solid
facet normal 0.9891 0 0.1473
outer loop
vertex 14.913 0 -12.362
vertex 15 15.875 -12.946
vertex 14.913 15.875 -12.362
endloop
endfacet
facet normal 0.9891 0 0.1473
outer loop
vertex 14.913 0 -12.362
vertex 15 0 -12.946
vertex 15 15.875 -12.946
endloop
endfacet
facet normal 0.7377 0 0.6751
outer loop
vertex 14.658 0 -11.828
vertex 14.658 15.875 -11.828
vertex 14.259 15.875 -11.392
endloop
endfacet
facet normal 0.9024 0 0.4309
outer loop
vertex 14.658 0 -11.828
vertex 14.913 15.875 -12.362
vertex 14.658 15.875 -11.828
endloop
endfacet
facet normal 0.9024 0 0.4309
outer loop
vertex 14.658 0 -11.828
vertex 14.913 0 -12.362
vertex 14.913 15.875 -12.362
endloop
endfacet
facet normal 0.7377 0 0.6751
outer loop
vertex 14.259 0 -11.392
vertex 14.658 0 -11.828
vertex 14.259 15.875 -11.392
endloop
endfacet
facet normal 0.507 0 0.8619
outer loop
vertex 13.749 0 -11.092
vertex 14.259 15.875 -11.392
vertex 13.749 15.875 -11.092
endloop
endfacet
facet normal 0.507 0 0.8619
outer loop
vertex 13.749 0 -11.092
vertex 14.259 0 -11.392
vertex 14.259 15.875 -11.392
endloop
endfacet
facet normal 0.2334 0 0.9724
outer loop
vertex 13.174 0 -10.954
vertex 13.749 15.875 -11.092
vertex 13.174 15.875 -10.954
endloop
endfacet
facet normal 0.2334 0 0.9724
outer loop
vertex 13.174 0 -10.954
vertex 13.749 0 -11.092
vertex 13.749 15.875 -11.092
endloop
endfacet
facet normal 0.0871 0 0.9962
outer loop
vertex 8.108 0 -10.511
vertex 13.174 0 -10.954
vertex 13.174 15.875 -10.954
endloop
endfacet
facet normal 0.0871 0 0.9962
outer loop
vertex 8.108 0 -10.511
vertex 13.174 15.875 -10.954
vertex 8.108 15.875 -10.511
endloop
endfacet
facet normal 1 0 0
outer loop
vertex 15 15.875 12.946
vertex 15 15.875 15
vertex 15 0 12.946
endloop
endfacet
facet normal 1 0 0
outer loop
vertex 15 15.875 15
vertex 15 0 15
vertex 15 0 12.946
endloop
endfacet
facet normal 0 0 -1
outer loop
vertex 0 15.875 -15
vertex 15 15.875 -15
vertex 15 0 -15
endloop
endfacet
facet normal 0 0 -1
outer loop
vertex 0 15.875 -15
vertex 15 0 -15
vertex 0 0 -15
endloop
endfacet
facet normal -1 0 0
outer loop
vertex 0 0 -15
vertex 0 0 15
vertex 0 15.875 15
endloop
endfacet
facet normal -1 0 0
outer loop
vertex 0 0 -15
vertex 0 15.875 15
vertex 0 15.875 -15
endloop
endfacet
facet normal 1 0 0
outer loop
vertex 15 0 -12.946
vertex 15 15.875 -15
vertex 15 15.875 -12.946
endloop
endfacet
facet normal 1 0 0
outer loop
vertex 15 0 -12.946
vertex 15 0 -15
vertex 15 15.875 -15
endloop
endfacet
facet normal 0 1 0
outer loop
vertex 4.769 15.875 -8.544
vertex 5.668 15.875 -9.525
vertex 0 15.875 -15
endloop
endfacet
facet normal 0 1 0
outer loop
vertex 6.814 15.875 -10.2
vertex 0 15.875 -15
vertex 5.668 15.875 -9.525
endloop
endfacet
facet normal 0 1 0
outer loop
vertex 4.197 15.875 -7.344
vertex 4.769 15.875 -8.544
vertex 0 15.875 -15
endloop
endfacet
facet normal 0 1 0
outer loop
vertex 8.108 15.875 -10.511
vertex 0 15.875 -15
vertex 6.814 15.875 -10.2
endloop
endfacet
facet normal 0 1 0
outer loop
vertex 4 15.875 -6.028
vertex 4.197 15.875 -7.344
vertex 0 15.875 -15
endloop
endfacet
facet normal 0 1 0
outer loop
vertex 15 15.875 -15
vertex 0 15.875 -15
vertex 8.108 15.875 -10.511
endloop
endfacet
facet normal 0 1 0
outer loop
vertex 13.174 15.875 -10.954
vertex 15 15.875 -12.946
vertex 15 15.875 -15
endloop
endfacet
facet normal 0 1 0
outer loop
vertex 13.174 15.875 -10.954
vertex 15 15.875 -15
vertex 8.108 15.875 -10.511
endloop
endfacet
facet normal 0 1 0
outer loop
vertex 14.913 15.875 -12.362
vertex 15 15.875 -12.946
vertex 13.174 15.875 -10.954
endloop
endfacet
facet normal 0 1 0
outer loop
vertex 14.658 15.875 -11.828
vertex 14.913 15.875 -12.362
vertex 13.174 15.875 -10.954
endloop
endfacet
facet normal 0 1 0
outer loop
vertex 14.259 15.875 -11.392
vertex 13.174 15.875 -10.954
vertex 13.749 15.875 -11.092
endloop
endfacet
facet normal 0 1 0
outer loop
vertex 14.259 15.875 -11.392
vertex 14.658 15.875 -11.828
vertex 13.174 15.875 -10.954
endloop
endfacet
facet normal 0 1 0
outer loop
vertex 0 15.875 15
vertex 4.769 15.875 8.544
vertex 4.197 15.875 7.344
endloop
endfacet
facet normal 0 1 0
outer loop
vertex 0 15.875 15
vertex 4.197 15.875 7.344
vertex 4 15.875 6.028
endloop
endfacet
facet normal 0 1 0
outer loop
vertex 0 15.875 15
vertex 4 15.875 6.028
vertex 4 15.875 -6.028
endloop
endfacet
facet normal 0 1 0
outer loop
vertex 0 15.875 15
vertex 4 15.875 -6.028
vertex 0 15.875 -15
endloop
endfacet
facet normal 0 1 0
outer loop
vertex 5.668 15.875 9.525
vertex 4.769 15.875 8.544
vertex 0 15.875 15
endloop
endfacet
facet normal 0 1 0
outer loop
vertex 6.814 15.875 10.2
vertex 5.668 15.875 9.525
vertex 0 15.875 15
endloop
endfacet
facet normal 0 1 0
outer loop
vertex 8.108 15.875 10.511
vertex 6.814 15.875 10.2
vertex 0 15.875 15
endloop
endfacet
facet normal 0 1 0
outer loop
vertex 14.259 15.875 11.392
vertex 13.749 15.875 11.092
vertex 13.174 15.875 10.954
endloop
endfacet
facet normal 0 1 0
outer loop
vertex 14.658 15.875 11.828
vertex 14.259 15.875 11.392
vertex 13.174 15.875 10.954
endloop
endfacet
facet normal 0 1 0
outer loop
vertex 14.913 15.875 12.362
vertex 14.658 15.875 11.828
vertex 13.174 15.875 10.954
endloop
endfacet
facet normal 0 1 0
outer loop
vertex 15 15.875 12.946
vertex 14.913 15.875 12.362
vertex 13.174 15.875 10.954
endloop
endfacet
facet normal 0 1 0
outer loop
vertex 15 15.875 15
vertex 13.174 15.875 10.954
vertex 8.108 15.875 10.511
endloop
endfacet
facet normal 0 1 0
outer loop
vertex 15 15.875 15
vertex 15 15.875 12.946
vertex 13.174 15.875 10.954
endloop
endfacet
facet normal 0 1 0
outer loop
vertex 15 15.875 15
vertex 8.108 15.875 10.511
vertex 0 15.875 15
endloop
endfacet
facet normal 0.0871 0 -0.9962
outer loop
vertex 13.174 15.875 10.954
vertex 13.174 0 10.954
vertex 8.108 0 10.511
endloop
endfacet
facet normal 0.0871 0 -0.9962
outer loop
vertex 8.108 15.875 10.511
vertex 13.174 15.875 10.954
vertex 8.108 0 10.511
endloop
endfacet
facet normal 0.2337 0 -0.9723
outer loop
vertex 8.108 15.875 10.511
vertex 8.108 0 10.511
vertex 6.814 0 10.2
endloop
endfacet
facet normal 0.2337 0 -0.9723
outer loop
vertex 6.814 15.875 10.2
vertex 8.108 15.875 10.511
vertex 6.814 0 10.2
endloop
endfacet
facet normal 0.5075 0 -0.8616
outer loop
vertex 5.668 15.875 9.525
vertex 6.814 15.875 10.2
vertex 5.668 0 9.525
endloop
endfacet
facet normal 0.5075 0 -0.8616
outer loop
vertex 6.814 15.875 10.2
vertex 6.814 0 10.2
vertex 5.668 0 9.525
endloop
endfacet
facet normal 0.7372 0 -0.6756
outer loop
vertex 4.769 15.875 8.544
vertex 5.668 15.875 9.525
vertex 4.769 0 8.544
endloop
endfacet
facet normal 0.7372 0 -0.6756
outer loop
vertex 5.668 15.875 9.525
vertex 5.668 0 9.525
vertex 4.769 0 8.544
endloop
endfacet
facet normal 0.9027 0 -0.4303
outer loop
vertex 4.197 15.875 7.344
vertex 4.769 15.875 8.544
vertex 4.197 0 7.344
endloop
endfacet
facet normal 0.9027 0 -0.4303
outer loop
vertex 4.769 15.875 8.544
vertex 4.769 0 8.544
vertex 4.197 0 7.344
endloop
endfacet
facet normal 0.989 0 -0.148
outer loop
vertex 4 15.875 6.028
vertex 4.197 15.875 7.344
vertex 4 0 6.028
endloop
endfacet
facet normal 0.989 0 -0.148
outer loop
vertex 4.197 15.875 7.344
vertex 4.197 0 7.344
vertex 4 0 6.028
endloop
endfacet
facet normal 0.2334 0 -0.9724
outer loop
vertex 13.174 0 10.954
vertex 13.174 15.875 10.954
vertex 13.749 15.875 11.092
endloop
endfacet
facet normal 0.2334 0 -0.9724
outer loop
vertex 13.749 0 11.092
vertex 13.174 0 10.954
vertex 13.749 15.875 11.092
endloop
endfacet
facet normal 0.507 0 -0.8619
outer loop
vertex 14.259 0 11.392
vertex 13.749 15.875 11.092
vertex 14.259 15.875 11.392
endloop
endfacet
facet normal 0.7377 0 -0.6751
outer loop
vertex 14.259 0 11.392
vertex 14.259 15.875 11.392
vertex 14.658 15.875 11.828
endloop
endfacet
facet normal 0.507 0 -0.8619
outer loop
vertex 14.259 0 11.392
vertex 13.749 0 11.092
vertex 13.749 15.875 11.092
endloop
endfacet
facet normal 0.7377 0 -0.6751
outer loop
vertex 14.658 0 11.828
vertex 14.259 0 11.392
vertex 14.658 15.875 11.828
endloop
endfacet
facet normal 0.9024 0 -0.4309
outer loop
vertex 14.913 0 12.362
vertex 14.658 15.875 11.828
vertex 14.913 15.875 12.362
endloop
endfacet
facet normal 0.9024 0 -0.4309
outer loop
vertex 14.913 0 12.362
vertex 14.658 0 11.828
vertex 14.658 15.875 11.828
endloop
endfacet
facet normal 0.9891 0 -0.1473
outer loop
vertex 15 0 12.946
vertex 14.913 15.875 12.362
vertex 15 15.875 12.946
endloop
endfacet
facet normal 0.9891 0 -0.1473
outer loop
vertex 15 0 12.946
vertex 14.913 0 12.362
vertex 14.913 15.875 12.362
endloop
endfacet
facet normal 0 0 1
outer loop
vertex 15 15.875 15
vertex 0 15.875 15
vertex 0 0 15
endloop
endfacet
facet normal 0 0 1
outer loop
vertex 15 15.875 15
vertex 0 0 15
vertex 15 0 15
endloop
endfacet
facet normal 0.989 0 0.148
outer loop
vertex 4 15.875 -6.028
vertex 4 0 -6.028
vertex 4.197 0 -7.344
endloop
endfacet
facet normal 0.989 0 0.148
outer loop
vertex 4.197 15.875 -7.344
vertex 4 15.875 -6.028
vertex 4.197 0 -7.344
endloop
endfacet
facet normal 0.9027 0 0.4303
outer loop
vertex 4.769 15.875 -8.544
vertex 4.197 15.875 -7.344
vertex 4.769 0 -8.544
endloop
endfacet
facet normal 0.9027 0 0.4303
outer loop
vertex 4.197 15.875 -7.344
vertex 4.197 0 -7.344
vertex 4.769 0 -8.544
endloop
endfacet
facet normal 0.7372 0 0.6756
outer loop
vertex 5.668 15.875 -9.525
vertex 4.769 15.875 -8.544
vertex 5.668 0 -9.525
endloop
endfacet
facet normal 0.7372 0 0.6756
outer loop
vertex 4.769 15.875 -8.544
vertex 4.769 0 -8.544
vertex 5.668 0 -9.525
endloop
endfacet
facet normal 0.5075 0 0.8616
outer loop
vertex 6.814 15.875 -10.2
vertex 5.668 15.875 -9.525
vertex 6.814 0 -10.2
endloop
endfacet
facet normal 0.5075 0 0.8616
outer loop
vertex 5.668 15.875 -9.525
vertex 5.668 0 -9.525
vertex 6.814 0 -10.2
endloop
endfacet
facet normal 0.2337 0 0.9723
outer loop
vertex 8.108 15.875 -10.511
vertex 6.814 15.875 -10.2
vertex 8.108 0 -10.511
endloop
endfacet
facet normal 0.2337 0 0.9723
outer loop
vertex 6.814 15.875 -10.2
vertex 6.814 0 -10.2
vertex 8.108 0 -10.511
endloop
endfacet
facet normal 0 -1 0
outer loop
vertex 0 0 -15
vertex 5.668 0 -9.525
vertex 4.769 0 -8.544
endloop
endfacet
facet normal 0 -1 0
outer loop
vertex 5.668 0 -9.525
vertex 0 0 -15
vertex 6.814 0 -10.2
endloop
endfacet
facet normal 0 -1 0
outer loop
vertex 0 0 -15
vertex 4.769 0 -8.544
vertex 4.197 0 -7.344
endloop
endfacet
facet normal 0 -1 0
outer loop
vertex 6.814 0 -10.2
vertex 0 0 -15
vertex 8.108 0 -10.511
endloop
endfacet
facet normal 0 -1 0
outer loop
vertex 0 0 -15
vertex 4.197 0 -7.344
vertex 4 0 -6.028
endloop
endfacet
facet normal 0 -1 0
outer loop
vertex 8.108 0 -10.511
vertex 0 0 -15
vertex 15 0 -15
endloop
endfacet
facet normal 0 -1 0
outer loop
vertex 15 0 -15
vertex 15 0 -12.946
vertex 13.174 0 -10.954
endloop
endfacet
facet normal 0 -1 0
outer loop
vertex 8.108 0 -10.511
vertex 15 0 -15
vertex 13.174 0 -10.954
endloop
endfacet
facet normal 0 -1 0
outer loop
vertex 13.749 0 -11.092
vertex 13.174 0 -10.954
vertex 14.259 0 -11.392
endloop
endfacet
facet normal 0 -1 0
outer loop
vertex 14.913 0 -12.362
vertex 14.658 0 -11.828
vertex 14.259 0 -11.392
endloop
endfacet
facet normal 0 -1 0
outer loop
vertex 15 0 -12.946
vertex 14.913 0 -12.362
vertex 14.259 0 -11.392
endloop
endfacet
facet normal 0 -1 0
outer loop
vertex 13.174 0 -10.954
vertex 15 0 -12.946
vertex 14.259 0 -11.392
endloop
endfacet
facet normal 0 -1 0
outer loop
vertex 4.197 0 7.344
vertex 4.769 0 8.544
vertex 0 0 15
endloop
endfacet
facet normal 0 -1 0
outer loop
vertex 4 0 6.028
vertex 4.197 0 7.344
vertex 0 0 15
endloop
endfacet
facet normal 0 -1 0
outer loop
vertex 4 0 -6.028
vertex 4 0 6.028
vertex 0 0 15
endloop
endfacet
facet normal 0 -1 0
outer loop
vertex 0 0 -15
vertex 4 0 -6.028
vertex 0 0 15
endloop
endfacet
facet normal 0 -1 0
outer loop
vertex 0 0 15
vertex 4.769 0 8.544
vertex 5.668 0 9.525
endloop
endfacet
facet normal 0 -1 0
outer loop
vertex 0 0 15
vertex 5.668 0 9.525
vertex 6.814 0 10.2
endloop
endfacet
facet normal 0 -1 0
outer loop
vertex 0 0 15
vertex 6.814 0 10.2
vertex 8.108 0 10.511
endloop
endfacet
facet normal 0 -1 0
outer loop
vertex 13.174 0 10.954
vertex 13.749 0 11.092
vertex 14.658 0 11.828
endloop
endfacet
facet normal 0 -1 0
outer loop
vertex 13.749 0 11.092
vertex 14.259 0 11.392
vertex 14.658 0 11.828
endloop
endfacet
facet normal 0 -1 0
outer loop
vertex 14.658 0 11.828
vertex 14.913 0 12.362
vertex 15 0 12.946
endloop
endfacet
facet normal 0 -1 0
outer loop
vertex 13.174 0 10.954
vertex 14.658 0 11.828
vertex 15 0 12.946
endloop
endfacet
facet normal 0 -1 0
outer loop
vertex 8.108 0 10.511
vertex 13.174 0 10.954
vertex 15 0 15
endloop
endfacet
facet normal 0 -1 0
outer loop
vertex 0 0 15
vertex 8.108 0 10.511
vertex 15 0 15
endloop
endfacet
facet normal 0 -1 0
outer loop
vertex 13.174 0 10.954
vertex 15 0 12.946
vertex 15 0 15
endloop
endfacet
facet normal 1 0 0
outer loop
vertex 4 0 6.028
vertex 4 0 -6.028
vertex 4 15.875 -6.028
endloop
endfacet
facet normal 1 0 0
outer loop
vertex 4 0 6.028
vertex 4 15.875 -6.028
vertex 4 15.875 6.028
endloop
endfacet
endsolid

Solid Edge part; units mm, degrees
sketch "Sketch1" plane through (0, 0, 0) normal (0, -1, 0) x (1, 0, 0)
  line L0 (15, -15) -> (0, -15)
  line L1 (0, 15) -> (0, -15)
  line L2 (0, 15) -> (15, 15)
  line L3 (15, 15) -> (15, 12.9464)
  arc A0 (13.1743, 10.954) -> (15, 12.9464) centre (13, 12.9464) ccw
  line L4 (13.1743, 10.954) -> (8.1078, 10.5107)
  arc A1 (8.1078, 10.5107) -> (4, 6.0279) centre (8.5, 6.0279) ccw
  line L5 (4, -6.0279) -> (4, 6.0279)
  arc A2 (4, -6.0279) -> (8.1078, -10.5107) centre (8.5, -6.0279) ccw
  line L6 (13.1743, -10.954) -> (8.1078, -10.5107)
  arc A3 (13.1743, -10.954) -> (15, -12.9464) centre (13, -12.9464) cw
  line L7 (15, -15) -> (15, -12.9464)
  dimension "D1" = 15
extrude "Protrusion1" add sketch "Sketch1" against normal blind 15.875
